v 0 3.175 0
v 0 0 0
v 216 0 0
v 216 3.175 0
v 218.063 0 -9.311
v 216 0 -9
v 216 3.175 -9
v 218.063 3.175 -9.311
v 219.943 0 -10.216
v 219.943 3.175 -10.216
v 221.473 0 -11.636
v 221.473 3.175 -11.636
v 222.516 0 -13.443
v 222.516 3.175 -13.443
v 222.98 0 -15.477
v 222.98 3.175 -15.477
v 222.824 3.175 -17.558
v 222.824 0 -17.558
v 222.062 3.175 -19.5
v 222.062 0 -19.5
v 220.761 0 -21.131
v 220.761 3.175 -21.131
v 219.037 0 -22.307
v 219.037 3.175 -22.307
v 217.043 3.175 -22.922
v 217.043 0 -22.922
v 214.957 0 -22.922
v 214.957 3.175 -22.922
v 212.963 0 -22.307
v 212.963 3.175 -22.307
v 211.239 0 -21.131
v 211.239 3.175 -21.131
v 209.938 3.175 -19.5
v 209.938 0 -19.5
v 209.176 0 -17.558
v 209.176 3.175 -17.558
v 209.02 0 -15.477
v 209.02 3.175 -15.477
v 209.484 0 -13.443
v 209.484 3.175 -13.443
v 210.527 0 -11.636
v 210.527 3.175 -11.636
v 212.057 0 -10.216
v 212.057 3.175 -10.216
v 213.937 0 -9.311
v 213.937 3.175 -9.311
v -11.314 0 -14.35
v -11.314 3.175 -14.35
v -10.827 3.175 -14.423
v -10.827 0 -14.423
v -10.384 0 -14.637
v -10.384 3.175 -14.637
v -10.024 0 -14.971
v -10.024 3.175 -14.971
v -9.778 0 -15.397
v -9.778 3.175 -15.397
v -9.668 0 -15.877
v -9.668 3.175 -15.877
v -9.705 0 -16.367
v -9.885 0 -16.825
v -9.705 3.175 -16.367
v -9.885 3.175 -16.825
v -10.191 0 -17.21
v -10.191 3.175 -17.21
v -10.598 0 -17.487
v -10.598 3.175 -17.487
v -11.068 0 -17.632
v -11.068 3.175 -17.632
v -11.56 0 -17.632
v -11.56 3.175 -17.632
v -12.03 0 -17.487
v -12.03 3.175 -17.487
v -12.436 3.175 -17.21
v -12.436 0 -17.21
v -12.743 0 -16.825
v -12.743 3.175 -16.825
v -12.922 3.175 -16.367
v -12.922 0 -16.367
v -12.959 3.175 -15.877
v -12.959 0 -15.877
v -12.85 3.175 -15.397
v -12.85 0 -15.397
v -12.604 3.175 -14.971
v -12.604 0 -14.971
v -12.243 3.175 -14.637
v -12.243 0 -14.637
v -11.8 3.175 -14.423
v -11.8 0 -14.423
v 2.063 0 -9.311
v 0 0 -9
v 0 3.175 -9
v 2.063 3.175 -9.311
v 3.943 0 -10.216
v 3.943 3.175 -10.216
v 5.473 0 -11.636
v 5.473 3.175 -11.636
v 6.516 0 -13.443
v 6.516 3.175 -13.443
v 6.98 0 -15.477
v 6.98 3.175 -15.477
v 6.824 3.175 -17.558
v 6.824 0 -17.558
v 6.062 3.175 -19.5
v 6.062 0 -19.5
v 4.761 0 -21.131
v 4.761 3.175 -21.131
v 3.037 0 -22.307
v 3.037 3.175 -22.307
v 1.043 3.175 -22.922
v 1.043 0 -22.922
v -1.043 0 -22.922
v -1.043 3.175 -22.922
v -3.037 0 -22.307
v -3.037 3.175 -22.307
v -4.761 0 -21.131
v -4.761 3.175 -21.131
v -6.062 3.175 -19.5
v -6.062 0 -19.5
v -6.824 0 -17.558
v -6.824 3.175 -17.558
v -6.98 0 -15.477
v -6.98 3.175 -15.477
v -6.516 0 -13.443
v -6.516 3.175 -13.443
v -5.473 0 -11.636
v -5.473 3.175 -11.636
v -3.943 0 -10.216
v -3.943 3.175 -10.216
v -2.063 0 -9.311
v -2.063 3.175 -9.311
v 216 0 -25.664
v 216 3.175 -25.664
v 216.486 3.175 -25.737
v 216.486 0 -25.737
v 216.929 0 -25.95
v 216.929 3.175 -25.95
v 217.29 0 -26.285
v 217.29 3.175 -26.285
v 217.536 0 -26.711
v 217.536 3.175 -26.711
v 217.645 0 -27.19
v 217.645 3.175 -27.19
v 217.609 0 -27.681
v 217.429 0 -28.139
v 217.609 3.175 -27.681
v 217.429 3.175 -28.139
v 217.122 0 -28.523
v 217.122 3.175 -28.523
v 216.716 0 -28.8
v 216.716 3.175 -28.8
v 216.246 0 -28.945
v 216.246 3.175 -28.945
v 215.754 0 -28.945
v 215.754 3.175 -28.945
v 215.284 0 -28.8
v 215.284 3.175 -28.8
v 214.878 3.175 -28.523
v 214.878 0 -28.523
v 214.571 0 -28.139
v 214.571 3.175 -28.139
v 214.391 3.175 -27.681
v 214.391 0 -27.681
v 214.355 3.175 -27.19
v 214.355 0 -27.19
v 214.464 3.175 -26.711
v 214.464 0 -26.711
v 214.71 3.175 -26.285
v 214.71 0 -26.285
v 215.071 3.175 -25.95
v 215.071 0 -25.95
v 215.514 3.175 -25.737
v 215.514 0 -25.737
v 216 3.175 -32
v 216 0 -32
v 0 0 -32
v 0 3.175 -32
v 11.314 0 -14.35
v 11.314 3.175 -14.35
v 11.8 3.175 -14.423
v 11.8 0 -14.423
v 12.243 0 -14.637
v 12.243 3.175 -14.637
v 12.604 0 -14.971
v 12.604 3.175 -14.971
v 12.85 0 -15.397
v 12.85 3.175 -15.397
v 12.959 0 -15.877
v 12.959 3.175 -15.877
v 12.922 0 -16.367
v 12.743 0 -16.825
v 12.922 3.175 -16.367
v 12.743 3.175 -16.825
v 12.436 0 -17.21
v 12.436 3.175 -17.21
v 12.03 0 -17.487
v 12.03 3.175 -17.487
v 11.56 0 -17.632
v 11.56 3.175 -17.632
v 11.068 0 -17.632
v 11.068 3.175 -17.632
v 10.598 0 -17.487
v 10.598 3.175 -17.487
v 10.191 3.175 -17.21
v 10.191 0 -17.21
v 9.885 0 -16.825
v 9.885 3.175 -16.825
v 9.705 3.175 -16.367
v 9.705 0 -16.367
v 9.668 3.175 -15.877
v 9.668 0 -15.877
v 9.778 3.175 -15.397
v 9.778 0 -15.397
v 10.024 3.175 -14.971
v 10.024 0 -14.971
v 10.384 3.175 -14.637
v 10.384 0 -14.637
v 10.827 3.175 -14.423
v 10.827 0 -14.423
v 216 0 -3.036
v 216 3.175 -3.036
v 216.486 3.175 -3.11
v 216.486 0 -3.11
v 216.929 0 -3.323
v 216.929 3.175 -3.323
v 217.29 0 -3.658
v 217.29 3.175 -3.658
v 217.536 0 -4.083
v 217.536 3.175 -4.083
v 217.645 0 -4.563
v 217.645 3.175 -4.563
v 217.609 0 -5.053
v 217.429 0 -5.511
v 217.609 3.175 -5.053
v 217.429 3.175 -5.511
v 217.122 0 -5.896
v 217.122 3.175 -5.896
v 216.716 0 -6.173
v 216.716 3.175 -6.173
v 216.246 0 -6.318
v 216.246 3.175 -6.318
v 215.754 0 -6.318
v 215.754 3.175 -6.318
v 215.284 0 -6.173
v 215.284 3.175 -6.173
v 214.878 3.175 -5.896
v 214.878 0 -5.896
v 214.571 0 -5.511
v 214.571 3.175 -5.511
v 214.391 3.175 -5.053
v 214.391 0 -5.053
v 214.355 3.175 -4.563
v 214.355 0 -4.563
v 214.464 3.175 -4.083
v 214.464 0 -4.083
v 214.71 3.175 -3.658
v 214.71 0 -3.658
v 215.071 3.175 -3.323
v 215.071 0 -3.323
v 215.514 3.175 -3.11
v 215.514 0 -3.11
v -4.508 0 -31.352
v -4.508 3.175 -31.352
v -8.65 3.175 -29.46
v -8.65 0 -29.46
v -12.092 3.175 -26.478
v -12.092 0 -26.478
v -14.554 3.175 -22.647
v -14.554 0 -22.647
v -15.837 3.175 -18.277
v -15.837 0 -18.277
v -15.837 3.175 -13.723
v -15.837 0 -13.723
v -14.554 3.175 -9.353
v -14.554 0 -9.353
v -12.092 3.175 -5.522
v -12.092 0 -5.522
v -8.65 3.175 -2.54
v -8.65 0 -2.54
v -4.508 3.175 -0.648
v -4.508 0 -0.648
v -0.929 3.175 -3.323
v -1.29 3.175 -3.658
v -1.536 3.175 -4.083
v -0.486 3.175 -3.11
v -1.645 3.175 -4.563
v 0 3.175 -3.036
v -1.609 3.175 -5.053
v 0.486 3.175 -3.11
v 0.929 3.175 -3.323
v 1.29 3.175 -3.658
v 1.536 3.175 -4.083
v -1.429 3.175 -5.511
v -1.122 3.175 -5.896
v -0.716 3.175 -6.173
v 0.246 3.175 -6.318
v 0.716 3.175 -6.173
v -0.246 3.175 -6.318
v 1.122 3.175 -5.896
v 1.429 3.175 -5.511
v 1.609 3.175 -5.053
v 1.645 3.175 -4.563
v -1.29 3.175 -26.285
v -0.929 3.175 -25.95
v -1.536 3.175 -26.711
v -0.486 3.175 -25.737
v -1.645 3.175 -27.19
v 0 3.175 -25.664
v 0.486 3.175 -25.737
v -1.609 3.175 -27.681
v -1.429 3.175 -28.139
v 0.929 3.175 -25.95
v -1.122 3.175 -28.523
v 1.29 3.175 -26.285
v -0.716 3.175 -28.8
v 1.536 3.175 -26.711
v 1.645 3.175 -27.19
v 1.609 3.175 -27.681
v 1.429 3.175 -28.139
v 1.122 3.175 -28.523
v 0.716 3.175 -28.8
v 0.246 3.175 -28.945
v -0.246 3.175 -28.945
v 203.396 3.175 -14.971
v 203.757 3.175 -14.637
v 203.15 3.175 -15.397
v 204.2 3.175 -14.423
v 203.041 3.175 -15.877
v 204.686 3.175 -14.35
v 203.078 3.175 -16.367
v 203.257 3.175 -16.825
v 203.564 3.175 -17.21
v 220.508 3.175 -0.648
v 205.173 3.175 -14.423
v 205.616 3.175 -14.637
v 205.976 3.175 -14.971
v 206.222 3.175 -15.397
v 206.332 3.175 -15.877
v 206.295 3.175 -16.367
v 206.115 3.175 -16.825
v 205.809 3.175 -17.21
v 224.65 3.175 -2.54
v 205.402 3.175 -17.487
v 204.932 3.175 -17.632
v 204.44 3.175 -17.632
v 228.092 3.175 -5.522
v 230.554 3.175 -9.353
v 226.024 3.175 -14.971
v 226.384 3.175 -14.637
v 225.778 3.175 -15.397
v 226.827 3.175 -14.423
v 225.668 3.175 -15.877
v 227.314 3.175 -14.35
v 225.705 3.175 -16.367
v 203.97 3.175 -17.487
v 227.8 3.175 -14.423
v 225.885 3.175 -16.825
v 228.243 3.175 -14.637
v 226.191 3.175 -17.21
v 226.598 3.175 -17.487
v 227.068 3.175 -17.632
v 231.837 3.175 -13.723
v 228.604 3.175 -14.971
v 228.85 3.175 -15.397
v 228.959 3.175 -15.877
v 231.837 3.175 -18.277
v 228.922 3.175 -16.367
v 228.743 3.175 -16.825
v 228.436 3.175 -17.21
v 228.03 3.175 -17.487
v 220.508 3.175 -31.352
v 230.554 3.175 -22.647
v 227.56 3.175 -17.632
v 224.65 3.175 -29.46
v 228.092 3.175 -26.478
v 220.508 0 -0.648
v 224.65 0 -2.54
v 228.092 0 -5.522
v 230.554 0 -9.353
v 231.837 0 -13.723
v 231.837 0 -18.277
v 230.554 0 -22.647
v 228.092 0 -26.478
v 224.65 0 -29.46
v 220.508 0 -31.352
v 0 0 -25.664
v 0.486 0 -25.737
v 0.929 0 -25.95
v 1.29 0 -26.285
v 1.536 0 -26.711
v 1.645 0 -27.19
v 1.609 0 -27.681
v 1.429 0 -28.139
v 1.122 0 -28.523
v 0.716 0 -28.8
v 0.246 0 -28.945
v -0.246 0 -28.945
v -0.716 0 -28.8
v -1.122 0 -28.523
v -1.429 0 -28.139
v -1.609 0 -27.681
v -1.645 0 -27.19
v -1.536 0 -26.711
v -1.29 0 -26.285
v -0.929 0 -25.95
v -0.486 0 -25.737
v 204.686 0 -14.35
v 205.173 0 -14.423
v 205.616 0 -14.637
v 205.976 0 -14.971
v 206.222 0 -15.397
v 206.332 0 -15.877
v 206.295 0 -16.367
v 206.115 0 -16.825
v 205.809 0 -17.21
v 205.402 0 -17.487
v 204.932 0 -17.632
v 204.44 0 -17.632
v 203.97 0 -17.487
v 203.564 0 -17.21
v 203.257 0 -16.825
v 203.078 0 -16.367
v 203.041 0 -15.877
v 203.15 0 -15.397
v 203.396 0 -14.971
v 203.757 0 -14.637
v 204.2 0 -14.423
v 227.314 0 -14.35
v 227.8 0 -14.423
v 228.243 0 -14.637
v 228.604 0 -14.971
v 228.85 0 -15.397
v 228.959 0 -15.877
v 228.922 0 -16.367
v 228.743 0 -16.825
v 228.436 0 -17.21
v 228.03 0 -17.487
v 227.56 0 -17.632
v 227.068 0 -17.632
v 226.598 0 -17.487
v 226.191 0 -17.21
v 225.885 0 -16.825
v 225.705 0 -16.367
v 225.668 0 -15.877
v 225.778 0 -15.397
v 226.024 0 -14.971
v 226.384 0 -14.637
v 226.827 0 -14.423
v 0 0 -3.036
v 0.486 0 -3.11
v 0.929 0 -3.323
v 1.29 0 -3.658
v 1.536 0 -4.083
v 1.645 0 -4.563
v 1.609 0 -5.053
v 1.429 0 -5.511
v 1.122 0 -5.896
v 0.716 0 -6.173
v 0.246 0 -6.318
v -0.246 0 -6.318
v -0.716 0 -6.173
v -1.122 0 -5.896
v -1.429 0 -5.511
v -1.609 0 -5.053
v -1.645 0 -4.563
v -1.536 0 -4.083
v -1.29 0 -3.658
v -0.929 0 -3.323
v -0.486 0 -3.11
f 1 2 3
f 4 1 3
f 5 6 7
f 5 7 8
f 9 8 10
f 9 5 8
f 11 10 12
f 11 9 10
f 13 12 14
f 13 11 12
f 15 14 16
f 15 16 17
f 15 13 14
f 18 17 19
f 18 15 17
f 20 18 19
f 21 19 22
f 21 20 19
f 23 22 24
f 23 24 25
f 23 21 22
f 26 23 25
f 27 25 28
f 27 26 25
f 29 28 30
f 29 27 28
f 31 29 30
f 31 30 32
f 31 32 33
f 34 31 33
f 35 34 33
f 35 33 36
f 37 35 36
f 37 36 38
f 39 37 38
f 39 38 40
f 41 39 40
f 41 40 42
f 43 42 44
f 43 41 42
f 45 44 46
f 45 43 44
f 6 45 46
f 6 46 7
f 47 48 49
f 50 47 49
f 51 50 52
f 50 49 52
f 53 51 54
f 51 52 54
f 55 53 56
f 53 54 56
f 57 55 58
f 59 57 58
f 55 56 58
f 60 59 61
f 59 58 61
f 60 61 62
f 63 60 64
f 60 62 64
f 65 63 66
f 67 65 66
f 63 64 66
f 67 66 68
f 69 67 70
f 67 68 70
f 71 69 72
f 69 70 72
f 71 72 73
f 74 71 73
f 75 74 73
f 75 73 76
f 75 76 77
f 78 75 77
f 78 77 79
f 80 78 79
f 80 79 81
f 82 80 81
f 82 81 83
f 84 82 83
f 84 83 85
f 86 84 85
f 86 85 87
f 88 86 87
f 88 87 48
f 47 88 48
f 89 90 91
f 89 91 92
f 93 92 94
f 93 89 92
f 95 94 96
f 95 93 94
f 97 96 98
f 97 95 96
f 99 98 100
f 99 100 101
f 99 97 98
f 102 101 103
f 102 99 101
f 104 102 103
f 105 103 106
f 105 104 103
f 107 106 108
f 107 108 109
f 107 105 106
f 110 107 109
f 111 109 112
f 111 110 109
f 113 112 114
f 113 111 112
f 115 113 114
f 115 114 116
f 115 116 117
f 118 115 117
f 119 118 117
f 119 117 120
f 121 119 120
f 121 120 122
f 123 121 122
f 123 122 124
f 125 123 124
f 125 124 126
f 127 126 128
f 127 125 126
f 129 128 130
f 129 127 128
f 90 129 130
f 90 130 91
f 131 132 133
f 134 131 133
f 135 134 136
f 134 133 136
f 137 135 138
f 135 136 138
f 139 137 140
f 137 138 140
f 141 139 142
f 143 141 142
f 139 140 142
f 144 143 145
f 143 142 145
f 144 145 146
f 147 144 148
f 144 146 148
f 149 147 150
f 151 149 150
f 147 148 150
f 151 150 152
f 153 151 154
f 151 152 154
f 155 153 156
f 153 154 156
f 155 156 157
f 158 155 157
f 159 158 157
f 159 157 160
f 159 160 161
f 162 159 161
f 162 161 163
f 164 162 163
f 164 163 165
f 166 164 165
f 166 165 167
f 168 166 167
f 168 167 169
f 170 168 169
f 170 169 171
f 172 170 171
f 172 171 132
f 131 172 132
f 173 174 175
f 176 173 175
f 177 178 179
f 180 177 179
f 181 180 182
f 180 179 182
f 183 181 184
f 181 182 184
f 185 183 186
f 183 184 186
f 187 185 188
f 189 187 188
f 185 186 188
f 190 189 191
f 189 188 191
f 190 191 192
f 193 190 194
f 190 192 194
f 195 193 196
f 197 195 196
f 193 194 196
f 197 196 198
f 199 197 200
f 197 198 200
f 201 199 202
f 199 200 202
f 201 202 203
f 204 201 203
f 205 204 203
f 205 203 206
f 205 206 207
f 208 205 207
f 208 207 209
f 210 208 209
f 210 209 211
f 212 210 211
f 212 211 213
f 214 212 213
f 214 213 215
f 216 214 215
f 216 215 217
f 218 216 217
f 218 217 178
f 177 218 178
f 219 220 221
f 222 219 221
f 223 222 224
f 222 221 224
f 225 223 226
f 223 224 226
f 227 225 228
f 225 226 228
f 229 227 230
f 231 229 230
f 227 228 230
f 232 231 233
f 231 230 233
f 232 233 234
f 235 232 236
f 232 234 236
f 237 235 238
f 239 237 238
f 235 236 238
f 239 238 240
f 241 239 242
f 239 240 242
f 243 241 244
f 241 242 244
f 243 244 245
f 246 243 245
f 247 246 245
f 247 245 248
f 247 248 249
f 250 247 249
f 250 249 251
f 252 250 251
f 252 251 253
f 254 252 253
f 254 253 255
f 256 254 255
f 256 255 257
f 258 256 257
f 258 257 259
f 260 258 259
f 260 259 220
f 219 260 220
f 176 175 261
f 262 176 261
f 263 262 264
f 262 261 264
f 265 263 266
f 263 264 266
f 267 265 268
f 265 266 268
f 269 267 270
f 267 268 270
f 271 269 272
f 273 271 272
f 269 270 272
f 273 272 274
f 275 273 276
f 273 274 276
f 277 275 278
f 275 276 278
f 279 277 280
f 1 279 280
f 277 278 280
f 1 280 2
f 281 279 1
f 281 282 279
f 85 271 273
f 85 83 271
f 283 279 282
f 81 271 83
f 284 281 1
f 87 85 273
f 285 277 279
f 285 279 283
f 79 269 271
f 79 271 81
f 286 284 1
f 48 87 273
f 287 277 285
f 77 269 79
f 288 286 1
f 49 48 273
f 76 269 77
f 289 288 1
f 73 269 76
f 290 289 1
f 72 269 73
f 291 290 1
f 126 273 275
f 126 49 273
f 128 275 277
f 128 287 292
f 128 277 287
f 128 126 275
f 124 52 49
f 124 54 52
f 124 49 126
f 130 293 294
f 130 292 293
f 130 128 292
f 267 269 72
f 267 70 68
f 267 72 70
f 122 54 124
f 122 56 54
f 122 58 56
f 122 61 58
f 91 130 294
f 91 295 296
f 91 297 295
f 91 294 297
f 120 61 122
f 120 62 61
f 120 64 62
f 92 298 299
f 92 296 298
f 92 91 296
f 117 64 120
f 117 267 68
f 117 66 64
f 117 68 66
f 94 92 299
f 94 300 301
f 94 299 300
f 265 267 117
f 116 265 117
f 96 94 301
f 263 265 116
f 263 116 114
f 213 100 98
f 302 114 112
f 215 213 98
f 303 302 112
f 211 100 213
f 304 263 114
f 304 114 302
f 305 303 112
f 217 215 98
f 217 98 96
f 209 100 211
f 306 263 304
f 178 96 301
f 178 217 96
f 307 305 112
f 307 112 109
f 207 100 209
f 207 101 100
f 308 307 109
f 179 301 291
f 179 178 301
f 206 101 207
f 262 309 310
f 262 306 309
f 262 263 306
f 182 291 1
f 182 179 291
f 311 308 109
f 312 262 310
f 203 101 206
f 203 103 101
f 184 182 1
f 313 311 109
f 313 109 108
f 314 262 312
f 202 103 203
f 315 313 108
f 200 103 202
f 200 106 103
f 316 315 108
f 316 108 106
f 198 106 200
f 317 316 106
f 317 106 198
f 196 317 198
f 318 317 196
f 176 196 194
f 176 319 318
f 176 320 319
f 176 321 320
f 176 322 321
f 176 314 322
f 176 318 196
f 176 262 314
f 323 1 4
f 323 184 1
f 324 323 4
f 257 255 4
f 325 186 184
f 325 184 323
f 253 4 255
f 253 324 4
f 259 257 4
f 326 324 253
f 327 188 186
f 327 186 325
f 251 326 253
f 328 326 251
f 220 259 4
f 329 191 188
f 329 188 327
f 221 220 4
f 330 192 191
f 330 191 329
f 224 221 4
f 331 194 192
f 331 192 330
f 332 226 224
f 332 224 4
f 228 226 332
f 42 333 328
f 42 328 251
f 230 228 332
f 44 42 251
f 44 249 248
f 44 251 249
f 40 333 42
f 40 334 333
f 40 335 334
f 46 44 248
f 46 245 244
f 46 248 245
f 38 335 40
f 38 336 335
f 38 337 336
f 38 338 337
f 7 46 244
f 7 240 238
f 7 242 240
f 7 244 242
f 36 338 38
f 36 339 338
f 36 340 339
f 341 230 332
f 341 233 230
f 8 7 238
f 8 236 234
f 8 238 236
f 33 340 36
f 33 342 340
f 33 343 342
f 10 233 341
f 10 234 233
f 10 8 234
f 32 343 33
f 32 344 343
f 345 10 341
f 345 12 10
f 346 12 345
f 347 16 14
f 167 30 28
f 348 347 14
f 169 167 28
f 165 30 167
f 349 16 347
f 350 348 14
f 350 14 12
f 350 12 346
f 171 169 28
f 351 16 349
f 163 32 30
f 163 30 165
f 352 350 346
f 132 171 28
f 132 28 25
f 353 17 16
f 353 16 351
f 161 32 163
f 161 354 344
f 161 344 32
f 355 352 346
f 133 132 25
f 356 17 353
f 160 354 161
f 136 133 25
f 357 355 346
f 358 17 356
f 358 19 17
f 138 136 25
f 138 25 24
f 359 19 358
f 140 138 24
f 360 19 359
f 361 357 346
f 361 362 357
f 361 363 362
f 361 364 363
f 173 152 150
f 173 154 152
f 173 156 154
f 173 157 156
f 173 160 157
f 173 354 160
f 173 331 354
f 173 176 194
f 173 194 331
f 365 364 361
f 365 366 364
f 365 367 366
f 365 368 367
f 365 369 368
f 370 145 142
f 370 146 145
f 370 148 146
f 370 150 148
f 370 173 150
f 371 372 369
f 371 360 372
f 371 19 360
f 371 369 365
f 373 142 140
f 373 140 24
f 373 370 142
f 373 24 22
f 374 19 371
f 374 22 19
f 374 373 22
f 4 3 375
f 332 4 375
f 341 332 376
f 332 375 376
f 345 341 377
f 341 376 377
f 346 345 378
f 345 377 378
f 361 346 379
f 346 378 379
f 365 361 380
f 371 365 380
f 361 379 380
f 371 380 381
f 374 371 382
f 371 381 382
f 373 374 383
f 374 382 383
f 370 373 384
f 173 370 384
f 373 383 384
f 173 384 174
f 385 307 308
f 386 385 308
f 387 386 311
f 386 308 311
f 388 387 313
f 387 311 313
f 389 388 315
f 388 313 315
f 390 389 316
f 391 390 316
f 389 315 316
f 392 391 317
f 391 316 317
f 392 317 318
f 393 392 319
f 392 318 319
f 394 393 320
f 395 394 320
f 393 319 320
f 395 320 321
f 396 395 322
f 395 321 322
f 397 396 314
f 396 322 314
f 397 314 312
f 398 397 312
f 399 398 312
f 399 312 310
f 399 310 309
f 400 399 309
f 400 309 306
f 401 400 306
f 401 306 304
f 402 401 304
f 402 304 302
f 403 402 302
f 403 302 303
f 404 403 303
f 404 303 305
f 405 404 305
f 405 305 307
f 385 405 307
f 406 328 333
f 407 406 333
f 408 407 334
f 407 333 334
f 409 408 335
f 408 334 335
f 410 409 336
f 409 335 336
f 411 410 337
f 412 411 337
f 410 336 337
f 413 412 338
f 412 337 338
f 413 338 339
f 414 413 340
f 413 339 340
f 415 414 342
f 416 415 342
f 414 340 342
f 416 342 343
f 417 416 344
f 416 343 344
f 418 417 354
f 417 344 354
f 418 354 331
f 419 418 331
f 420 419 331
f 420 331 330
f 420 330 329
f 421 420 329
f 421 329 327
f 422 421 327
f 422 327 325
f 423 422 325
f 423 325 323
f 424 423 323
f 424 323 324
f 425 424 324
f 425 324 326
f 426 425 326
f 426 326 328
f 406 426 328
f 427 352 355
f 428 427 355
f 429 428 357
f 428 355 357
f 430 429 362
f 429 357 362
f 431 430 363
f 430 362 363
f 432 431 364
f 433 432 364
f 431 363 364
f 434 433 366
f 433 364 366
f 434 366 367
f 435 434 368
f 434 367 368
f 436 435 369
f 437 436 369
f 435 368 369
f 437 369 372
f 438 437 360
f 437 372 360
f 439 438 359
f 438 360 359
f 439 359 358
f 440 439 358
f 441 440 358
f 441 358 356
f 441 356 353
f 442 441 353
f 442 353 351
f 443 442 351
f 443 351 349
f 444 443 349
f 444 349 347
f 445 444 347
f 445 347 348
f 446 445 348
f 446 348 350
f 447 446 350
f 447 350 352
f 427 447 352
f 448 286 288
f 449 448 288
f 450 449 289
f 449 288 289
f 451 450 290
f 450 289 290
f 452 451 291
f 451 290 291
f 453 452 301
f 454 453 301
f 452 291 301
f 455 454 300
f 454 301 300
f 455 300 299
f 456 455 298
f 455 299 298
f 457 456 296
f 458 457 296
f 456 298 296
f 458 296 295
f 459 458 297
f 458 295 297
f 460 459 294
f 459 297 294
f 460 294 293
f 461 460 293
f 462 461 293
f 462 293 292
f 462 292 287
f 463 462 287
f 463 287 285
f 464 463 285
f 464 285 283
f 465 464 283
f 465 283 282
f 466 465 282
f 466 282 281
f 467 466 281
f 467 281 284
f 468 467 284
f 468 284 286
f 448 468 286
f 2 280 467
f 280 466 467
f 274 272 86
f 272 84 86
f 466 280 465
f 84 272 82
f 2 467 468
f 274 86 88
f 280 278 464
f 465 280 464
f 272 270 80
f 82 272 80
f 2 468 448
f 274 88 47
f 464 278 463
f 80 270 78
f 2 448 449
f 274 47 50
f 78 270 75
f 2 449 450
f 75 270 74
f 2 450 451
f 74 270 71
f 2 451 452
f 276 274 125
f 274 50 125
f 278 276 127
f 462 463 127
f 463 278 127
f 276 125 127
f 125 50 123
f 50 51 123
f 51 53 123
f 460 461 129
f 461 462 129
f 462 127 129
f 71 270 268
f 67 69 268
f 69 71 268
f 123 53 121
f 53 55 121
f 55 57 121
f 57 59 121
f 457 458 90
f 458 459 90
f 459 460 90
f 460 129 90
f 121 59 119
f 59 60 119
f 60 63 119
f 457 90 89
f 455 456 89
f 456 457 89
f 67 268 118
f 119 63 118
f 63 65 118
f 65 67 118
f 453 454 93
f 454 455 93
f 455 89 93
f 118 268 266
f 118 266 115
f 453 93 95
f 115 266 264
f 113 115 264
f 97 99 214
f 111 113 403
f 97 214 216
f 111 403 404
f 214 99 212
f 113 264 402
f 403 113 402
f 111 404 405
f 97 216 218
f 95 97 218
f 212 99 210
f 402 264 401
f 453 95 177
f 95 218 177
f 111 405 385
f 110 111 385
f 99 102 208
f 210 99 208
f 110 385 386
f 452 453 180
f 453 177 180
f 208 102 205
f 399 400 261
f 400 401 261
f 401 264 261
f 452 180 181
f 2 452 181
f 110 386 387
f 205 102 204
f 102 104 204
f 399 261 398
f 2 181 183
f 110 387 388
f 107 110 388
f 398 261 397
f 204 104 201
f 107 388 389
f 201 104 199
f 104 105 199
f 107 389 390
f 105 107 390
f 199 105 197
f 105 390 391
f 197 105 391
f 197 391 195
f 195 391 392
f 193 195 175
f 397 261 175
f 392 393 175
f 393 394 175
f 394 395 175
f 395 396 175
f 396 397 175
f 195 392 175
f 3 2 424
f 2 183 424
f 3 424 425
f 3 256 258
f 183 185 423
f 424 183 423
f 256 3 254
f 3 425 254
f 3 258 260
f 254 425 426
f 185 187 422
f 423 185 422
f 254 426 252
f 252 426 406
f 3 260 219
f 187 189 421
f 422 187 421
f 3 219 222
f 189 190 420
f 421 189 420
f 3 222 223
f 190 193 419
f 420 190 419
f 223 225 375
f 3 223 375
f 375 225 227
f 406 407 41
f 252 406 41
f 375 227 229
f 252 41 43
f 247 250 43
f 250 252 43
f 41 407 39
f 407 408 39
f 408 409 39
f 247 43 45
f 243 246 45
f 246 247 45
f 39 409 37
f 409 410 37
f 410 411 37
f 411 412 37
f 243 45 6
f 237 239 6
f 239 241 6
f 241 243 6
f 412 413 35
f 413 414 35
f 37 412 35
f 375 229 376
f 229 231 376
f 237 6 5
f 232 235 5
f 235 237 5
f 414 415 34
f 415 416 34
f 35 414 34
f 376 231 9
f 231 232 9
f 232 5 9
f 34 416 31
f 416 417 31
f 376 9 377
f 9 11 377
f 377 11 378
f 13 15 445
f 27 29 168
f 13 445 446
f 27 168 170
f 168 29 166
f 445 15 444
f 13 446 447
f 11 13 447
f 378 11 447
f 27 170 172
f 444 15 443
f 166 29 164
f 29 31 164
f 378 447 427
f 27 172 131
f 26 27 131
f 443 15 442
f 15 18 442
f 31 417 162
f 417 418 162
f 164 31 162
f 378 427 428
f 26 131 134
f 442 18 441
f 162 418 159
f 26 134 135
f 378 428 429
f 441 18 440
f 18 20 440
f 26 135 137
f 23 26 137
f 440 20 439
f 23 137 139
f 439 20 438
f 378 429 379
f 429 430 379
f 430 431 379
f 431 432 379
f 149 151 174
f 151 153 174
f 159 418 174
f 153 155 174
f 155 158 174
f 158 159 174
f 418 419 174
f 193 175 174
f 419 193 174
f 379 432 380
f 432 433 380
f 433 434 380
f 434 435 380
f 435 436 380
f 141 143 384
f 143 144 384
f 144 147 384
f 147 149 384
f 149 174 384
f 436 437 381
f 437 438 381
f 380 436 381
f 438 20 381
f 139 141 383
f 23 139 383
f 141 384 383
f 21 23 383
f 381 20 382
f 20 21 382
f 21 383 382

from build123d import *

# Parameters (mm, degrees)
SKETCH1_R           = 7
BOSS_EXTRUDE1_DEPTH = 3.175
SKETCH2_R           = 1.65
CUT_EXTRUDE1_DEPTH  = 10


with BuildPart() as part:
    # Sketch1 → Boss-Extrude1 (new body)
    with BuildSketch(Plane(origin=(0, 0, 0), x_dir=(1, 0, 0), z_dir=(0, 1, 0))):
        with BuildLine():
            Line((0, 0), (216, 0))
            ThreePointArc((216, 0), (232, 16), (216, 32))
            Line((216, 32), (0, 32))
            ThreePointArc((0, 32), (-16, 16), (0, 0))
        make_face()
        with Locations(Location((0, 16, 0), (0, 0, 270))):
            Circle(SKETCH1_R, mode=Mode.SUBTRACT)
        with Locations(Location((216, 16, 0), (0, 0, 270))):
            Circle(SKETCH1_R, mode=Mode.SUBTRACT)
    extrude(amount=BOSS_EXTRUDE1_DEPTH)

    # Sketch2 → Cut-Extrude1 (cut)
    with BuildSketch(Plane(origin=(0, 3.175, 0), x_dir=(1, 0, 0), z_dir=(0, 1, 0))):
        with Locations(Location((204.686291501, 16, 0), (0, 0, 270))):
            Circle(SKETCH2_R)
        with Locations(Location((216, 27.313708499, 0), (0, 0, 270))):
            Circle(SKETCH2_R)
        with Locations(Location((-11.313708499, 16, 0), (0, 0, 270))):
            Circle(SKETCH2_R)
        with Locations(Location((0, 27.313708499, 0), (0, 0, 270))):
            Circle(SKETCH2_R)
        with Locations(Location((11.313708499, 16, 0), (0, 0, 270))):
            Circle(SKETCH2_R)
        with Locations(Location((0, 4.686291501, 0), (0, 0, 270))):
            Circle(SKETCH2_R)
        with Locations(Location((216, 4.686291501, 0), (0, 0, 270))):
            Circle(SKETCH2_R)
        with Locations(Location((227.313708499, 16, 0), (0, 0, 270))):
            Circle(SKETCH2_R)
    extrude(amount=-CUT_EXTRUDE1_DEPTH, mode=Mode.SUBTRACT)


solid = part.part
